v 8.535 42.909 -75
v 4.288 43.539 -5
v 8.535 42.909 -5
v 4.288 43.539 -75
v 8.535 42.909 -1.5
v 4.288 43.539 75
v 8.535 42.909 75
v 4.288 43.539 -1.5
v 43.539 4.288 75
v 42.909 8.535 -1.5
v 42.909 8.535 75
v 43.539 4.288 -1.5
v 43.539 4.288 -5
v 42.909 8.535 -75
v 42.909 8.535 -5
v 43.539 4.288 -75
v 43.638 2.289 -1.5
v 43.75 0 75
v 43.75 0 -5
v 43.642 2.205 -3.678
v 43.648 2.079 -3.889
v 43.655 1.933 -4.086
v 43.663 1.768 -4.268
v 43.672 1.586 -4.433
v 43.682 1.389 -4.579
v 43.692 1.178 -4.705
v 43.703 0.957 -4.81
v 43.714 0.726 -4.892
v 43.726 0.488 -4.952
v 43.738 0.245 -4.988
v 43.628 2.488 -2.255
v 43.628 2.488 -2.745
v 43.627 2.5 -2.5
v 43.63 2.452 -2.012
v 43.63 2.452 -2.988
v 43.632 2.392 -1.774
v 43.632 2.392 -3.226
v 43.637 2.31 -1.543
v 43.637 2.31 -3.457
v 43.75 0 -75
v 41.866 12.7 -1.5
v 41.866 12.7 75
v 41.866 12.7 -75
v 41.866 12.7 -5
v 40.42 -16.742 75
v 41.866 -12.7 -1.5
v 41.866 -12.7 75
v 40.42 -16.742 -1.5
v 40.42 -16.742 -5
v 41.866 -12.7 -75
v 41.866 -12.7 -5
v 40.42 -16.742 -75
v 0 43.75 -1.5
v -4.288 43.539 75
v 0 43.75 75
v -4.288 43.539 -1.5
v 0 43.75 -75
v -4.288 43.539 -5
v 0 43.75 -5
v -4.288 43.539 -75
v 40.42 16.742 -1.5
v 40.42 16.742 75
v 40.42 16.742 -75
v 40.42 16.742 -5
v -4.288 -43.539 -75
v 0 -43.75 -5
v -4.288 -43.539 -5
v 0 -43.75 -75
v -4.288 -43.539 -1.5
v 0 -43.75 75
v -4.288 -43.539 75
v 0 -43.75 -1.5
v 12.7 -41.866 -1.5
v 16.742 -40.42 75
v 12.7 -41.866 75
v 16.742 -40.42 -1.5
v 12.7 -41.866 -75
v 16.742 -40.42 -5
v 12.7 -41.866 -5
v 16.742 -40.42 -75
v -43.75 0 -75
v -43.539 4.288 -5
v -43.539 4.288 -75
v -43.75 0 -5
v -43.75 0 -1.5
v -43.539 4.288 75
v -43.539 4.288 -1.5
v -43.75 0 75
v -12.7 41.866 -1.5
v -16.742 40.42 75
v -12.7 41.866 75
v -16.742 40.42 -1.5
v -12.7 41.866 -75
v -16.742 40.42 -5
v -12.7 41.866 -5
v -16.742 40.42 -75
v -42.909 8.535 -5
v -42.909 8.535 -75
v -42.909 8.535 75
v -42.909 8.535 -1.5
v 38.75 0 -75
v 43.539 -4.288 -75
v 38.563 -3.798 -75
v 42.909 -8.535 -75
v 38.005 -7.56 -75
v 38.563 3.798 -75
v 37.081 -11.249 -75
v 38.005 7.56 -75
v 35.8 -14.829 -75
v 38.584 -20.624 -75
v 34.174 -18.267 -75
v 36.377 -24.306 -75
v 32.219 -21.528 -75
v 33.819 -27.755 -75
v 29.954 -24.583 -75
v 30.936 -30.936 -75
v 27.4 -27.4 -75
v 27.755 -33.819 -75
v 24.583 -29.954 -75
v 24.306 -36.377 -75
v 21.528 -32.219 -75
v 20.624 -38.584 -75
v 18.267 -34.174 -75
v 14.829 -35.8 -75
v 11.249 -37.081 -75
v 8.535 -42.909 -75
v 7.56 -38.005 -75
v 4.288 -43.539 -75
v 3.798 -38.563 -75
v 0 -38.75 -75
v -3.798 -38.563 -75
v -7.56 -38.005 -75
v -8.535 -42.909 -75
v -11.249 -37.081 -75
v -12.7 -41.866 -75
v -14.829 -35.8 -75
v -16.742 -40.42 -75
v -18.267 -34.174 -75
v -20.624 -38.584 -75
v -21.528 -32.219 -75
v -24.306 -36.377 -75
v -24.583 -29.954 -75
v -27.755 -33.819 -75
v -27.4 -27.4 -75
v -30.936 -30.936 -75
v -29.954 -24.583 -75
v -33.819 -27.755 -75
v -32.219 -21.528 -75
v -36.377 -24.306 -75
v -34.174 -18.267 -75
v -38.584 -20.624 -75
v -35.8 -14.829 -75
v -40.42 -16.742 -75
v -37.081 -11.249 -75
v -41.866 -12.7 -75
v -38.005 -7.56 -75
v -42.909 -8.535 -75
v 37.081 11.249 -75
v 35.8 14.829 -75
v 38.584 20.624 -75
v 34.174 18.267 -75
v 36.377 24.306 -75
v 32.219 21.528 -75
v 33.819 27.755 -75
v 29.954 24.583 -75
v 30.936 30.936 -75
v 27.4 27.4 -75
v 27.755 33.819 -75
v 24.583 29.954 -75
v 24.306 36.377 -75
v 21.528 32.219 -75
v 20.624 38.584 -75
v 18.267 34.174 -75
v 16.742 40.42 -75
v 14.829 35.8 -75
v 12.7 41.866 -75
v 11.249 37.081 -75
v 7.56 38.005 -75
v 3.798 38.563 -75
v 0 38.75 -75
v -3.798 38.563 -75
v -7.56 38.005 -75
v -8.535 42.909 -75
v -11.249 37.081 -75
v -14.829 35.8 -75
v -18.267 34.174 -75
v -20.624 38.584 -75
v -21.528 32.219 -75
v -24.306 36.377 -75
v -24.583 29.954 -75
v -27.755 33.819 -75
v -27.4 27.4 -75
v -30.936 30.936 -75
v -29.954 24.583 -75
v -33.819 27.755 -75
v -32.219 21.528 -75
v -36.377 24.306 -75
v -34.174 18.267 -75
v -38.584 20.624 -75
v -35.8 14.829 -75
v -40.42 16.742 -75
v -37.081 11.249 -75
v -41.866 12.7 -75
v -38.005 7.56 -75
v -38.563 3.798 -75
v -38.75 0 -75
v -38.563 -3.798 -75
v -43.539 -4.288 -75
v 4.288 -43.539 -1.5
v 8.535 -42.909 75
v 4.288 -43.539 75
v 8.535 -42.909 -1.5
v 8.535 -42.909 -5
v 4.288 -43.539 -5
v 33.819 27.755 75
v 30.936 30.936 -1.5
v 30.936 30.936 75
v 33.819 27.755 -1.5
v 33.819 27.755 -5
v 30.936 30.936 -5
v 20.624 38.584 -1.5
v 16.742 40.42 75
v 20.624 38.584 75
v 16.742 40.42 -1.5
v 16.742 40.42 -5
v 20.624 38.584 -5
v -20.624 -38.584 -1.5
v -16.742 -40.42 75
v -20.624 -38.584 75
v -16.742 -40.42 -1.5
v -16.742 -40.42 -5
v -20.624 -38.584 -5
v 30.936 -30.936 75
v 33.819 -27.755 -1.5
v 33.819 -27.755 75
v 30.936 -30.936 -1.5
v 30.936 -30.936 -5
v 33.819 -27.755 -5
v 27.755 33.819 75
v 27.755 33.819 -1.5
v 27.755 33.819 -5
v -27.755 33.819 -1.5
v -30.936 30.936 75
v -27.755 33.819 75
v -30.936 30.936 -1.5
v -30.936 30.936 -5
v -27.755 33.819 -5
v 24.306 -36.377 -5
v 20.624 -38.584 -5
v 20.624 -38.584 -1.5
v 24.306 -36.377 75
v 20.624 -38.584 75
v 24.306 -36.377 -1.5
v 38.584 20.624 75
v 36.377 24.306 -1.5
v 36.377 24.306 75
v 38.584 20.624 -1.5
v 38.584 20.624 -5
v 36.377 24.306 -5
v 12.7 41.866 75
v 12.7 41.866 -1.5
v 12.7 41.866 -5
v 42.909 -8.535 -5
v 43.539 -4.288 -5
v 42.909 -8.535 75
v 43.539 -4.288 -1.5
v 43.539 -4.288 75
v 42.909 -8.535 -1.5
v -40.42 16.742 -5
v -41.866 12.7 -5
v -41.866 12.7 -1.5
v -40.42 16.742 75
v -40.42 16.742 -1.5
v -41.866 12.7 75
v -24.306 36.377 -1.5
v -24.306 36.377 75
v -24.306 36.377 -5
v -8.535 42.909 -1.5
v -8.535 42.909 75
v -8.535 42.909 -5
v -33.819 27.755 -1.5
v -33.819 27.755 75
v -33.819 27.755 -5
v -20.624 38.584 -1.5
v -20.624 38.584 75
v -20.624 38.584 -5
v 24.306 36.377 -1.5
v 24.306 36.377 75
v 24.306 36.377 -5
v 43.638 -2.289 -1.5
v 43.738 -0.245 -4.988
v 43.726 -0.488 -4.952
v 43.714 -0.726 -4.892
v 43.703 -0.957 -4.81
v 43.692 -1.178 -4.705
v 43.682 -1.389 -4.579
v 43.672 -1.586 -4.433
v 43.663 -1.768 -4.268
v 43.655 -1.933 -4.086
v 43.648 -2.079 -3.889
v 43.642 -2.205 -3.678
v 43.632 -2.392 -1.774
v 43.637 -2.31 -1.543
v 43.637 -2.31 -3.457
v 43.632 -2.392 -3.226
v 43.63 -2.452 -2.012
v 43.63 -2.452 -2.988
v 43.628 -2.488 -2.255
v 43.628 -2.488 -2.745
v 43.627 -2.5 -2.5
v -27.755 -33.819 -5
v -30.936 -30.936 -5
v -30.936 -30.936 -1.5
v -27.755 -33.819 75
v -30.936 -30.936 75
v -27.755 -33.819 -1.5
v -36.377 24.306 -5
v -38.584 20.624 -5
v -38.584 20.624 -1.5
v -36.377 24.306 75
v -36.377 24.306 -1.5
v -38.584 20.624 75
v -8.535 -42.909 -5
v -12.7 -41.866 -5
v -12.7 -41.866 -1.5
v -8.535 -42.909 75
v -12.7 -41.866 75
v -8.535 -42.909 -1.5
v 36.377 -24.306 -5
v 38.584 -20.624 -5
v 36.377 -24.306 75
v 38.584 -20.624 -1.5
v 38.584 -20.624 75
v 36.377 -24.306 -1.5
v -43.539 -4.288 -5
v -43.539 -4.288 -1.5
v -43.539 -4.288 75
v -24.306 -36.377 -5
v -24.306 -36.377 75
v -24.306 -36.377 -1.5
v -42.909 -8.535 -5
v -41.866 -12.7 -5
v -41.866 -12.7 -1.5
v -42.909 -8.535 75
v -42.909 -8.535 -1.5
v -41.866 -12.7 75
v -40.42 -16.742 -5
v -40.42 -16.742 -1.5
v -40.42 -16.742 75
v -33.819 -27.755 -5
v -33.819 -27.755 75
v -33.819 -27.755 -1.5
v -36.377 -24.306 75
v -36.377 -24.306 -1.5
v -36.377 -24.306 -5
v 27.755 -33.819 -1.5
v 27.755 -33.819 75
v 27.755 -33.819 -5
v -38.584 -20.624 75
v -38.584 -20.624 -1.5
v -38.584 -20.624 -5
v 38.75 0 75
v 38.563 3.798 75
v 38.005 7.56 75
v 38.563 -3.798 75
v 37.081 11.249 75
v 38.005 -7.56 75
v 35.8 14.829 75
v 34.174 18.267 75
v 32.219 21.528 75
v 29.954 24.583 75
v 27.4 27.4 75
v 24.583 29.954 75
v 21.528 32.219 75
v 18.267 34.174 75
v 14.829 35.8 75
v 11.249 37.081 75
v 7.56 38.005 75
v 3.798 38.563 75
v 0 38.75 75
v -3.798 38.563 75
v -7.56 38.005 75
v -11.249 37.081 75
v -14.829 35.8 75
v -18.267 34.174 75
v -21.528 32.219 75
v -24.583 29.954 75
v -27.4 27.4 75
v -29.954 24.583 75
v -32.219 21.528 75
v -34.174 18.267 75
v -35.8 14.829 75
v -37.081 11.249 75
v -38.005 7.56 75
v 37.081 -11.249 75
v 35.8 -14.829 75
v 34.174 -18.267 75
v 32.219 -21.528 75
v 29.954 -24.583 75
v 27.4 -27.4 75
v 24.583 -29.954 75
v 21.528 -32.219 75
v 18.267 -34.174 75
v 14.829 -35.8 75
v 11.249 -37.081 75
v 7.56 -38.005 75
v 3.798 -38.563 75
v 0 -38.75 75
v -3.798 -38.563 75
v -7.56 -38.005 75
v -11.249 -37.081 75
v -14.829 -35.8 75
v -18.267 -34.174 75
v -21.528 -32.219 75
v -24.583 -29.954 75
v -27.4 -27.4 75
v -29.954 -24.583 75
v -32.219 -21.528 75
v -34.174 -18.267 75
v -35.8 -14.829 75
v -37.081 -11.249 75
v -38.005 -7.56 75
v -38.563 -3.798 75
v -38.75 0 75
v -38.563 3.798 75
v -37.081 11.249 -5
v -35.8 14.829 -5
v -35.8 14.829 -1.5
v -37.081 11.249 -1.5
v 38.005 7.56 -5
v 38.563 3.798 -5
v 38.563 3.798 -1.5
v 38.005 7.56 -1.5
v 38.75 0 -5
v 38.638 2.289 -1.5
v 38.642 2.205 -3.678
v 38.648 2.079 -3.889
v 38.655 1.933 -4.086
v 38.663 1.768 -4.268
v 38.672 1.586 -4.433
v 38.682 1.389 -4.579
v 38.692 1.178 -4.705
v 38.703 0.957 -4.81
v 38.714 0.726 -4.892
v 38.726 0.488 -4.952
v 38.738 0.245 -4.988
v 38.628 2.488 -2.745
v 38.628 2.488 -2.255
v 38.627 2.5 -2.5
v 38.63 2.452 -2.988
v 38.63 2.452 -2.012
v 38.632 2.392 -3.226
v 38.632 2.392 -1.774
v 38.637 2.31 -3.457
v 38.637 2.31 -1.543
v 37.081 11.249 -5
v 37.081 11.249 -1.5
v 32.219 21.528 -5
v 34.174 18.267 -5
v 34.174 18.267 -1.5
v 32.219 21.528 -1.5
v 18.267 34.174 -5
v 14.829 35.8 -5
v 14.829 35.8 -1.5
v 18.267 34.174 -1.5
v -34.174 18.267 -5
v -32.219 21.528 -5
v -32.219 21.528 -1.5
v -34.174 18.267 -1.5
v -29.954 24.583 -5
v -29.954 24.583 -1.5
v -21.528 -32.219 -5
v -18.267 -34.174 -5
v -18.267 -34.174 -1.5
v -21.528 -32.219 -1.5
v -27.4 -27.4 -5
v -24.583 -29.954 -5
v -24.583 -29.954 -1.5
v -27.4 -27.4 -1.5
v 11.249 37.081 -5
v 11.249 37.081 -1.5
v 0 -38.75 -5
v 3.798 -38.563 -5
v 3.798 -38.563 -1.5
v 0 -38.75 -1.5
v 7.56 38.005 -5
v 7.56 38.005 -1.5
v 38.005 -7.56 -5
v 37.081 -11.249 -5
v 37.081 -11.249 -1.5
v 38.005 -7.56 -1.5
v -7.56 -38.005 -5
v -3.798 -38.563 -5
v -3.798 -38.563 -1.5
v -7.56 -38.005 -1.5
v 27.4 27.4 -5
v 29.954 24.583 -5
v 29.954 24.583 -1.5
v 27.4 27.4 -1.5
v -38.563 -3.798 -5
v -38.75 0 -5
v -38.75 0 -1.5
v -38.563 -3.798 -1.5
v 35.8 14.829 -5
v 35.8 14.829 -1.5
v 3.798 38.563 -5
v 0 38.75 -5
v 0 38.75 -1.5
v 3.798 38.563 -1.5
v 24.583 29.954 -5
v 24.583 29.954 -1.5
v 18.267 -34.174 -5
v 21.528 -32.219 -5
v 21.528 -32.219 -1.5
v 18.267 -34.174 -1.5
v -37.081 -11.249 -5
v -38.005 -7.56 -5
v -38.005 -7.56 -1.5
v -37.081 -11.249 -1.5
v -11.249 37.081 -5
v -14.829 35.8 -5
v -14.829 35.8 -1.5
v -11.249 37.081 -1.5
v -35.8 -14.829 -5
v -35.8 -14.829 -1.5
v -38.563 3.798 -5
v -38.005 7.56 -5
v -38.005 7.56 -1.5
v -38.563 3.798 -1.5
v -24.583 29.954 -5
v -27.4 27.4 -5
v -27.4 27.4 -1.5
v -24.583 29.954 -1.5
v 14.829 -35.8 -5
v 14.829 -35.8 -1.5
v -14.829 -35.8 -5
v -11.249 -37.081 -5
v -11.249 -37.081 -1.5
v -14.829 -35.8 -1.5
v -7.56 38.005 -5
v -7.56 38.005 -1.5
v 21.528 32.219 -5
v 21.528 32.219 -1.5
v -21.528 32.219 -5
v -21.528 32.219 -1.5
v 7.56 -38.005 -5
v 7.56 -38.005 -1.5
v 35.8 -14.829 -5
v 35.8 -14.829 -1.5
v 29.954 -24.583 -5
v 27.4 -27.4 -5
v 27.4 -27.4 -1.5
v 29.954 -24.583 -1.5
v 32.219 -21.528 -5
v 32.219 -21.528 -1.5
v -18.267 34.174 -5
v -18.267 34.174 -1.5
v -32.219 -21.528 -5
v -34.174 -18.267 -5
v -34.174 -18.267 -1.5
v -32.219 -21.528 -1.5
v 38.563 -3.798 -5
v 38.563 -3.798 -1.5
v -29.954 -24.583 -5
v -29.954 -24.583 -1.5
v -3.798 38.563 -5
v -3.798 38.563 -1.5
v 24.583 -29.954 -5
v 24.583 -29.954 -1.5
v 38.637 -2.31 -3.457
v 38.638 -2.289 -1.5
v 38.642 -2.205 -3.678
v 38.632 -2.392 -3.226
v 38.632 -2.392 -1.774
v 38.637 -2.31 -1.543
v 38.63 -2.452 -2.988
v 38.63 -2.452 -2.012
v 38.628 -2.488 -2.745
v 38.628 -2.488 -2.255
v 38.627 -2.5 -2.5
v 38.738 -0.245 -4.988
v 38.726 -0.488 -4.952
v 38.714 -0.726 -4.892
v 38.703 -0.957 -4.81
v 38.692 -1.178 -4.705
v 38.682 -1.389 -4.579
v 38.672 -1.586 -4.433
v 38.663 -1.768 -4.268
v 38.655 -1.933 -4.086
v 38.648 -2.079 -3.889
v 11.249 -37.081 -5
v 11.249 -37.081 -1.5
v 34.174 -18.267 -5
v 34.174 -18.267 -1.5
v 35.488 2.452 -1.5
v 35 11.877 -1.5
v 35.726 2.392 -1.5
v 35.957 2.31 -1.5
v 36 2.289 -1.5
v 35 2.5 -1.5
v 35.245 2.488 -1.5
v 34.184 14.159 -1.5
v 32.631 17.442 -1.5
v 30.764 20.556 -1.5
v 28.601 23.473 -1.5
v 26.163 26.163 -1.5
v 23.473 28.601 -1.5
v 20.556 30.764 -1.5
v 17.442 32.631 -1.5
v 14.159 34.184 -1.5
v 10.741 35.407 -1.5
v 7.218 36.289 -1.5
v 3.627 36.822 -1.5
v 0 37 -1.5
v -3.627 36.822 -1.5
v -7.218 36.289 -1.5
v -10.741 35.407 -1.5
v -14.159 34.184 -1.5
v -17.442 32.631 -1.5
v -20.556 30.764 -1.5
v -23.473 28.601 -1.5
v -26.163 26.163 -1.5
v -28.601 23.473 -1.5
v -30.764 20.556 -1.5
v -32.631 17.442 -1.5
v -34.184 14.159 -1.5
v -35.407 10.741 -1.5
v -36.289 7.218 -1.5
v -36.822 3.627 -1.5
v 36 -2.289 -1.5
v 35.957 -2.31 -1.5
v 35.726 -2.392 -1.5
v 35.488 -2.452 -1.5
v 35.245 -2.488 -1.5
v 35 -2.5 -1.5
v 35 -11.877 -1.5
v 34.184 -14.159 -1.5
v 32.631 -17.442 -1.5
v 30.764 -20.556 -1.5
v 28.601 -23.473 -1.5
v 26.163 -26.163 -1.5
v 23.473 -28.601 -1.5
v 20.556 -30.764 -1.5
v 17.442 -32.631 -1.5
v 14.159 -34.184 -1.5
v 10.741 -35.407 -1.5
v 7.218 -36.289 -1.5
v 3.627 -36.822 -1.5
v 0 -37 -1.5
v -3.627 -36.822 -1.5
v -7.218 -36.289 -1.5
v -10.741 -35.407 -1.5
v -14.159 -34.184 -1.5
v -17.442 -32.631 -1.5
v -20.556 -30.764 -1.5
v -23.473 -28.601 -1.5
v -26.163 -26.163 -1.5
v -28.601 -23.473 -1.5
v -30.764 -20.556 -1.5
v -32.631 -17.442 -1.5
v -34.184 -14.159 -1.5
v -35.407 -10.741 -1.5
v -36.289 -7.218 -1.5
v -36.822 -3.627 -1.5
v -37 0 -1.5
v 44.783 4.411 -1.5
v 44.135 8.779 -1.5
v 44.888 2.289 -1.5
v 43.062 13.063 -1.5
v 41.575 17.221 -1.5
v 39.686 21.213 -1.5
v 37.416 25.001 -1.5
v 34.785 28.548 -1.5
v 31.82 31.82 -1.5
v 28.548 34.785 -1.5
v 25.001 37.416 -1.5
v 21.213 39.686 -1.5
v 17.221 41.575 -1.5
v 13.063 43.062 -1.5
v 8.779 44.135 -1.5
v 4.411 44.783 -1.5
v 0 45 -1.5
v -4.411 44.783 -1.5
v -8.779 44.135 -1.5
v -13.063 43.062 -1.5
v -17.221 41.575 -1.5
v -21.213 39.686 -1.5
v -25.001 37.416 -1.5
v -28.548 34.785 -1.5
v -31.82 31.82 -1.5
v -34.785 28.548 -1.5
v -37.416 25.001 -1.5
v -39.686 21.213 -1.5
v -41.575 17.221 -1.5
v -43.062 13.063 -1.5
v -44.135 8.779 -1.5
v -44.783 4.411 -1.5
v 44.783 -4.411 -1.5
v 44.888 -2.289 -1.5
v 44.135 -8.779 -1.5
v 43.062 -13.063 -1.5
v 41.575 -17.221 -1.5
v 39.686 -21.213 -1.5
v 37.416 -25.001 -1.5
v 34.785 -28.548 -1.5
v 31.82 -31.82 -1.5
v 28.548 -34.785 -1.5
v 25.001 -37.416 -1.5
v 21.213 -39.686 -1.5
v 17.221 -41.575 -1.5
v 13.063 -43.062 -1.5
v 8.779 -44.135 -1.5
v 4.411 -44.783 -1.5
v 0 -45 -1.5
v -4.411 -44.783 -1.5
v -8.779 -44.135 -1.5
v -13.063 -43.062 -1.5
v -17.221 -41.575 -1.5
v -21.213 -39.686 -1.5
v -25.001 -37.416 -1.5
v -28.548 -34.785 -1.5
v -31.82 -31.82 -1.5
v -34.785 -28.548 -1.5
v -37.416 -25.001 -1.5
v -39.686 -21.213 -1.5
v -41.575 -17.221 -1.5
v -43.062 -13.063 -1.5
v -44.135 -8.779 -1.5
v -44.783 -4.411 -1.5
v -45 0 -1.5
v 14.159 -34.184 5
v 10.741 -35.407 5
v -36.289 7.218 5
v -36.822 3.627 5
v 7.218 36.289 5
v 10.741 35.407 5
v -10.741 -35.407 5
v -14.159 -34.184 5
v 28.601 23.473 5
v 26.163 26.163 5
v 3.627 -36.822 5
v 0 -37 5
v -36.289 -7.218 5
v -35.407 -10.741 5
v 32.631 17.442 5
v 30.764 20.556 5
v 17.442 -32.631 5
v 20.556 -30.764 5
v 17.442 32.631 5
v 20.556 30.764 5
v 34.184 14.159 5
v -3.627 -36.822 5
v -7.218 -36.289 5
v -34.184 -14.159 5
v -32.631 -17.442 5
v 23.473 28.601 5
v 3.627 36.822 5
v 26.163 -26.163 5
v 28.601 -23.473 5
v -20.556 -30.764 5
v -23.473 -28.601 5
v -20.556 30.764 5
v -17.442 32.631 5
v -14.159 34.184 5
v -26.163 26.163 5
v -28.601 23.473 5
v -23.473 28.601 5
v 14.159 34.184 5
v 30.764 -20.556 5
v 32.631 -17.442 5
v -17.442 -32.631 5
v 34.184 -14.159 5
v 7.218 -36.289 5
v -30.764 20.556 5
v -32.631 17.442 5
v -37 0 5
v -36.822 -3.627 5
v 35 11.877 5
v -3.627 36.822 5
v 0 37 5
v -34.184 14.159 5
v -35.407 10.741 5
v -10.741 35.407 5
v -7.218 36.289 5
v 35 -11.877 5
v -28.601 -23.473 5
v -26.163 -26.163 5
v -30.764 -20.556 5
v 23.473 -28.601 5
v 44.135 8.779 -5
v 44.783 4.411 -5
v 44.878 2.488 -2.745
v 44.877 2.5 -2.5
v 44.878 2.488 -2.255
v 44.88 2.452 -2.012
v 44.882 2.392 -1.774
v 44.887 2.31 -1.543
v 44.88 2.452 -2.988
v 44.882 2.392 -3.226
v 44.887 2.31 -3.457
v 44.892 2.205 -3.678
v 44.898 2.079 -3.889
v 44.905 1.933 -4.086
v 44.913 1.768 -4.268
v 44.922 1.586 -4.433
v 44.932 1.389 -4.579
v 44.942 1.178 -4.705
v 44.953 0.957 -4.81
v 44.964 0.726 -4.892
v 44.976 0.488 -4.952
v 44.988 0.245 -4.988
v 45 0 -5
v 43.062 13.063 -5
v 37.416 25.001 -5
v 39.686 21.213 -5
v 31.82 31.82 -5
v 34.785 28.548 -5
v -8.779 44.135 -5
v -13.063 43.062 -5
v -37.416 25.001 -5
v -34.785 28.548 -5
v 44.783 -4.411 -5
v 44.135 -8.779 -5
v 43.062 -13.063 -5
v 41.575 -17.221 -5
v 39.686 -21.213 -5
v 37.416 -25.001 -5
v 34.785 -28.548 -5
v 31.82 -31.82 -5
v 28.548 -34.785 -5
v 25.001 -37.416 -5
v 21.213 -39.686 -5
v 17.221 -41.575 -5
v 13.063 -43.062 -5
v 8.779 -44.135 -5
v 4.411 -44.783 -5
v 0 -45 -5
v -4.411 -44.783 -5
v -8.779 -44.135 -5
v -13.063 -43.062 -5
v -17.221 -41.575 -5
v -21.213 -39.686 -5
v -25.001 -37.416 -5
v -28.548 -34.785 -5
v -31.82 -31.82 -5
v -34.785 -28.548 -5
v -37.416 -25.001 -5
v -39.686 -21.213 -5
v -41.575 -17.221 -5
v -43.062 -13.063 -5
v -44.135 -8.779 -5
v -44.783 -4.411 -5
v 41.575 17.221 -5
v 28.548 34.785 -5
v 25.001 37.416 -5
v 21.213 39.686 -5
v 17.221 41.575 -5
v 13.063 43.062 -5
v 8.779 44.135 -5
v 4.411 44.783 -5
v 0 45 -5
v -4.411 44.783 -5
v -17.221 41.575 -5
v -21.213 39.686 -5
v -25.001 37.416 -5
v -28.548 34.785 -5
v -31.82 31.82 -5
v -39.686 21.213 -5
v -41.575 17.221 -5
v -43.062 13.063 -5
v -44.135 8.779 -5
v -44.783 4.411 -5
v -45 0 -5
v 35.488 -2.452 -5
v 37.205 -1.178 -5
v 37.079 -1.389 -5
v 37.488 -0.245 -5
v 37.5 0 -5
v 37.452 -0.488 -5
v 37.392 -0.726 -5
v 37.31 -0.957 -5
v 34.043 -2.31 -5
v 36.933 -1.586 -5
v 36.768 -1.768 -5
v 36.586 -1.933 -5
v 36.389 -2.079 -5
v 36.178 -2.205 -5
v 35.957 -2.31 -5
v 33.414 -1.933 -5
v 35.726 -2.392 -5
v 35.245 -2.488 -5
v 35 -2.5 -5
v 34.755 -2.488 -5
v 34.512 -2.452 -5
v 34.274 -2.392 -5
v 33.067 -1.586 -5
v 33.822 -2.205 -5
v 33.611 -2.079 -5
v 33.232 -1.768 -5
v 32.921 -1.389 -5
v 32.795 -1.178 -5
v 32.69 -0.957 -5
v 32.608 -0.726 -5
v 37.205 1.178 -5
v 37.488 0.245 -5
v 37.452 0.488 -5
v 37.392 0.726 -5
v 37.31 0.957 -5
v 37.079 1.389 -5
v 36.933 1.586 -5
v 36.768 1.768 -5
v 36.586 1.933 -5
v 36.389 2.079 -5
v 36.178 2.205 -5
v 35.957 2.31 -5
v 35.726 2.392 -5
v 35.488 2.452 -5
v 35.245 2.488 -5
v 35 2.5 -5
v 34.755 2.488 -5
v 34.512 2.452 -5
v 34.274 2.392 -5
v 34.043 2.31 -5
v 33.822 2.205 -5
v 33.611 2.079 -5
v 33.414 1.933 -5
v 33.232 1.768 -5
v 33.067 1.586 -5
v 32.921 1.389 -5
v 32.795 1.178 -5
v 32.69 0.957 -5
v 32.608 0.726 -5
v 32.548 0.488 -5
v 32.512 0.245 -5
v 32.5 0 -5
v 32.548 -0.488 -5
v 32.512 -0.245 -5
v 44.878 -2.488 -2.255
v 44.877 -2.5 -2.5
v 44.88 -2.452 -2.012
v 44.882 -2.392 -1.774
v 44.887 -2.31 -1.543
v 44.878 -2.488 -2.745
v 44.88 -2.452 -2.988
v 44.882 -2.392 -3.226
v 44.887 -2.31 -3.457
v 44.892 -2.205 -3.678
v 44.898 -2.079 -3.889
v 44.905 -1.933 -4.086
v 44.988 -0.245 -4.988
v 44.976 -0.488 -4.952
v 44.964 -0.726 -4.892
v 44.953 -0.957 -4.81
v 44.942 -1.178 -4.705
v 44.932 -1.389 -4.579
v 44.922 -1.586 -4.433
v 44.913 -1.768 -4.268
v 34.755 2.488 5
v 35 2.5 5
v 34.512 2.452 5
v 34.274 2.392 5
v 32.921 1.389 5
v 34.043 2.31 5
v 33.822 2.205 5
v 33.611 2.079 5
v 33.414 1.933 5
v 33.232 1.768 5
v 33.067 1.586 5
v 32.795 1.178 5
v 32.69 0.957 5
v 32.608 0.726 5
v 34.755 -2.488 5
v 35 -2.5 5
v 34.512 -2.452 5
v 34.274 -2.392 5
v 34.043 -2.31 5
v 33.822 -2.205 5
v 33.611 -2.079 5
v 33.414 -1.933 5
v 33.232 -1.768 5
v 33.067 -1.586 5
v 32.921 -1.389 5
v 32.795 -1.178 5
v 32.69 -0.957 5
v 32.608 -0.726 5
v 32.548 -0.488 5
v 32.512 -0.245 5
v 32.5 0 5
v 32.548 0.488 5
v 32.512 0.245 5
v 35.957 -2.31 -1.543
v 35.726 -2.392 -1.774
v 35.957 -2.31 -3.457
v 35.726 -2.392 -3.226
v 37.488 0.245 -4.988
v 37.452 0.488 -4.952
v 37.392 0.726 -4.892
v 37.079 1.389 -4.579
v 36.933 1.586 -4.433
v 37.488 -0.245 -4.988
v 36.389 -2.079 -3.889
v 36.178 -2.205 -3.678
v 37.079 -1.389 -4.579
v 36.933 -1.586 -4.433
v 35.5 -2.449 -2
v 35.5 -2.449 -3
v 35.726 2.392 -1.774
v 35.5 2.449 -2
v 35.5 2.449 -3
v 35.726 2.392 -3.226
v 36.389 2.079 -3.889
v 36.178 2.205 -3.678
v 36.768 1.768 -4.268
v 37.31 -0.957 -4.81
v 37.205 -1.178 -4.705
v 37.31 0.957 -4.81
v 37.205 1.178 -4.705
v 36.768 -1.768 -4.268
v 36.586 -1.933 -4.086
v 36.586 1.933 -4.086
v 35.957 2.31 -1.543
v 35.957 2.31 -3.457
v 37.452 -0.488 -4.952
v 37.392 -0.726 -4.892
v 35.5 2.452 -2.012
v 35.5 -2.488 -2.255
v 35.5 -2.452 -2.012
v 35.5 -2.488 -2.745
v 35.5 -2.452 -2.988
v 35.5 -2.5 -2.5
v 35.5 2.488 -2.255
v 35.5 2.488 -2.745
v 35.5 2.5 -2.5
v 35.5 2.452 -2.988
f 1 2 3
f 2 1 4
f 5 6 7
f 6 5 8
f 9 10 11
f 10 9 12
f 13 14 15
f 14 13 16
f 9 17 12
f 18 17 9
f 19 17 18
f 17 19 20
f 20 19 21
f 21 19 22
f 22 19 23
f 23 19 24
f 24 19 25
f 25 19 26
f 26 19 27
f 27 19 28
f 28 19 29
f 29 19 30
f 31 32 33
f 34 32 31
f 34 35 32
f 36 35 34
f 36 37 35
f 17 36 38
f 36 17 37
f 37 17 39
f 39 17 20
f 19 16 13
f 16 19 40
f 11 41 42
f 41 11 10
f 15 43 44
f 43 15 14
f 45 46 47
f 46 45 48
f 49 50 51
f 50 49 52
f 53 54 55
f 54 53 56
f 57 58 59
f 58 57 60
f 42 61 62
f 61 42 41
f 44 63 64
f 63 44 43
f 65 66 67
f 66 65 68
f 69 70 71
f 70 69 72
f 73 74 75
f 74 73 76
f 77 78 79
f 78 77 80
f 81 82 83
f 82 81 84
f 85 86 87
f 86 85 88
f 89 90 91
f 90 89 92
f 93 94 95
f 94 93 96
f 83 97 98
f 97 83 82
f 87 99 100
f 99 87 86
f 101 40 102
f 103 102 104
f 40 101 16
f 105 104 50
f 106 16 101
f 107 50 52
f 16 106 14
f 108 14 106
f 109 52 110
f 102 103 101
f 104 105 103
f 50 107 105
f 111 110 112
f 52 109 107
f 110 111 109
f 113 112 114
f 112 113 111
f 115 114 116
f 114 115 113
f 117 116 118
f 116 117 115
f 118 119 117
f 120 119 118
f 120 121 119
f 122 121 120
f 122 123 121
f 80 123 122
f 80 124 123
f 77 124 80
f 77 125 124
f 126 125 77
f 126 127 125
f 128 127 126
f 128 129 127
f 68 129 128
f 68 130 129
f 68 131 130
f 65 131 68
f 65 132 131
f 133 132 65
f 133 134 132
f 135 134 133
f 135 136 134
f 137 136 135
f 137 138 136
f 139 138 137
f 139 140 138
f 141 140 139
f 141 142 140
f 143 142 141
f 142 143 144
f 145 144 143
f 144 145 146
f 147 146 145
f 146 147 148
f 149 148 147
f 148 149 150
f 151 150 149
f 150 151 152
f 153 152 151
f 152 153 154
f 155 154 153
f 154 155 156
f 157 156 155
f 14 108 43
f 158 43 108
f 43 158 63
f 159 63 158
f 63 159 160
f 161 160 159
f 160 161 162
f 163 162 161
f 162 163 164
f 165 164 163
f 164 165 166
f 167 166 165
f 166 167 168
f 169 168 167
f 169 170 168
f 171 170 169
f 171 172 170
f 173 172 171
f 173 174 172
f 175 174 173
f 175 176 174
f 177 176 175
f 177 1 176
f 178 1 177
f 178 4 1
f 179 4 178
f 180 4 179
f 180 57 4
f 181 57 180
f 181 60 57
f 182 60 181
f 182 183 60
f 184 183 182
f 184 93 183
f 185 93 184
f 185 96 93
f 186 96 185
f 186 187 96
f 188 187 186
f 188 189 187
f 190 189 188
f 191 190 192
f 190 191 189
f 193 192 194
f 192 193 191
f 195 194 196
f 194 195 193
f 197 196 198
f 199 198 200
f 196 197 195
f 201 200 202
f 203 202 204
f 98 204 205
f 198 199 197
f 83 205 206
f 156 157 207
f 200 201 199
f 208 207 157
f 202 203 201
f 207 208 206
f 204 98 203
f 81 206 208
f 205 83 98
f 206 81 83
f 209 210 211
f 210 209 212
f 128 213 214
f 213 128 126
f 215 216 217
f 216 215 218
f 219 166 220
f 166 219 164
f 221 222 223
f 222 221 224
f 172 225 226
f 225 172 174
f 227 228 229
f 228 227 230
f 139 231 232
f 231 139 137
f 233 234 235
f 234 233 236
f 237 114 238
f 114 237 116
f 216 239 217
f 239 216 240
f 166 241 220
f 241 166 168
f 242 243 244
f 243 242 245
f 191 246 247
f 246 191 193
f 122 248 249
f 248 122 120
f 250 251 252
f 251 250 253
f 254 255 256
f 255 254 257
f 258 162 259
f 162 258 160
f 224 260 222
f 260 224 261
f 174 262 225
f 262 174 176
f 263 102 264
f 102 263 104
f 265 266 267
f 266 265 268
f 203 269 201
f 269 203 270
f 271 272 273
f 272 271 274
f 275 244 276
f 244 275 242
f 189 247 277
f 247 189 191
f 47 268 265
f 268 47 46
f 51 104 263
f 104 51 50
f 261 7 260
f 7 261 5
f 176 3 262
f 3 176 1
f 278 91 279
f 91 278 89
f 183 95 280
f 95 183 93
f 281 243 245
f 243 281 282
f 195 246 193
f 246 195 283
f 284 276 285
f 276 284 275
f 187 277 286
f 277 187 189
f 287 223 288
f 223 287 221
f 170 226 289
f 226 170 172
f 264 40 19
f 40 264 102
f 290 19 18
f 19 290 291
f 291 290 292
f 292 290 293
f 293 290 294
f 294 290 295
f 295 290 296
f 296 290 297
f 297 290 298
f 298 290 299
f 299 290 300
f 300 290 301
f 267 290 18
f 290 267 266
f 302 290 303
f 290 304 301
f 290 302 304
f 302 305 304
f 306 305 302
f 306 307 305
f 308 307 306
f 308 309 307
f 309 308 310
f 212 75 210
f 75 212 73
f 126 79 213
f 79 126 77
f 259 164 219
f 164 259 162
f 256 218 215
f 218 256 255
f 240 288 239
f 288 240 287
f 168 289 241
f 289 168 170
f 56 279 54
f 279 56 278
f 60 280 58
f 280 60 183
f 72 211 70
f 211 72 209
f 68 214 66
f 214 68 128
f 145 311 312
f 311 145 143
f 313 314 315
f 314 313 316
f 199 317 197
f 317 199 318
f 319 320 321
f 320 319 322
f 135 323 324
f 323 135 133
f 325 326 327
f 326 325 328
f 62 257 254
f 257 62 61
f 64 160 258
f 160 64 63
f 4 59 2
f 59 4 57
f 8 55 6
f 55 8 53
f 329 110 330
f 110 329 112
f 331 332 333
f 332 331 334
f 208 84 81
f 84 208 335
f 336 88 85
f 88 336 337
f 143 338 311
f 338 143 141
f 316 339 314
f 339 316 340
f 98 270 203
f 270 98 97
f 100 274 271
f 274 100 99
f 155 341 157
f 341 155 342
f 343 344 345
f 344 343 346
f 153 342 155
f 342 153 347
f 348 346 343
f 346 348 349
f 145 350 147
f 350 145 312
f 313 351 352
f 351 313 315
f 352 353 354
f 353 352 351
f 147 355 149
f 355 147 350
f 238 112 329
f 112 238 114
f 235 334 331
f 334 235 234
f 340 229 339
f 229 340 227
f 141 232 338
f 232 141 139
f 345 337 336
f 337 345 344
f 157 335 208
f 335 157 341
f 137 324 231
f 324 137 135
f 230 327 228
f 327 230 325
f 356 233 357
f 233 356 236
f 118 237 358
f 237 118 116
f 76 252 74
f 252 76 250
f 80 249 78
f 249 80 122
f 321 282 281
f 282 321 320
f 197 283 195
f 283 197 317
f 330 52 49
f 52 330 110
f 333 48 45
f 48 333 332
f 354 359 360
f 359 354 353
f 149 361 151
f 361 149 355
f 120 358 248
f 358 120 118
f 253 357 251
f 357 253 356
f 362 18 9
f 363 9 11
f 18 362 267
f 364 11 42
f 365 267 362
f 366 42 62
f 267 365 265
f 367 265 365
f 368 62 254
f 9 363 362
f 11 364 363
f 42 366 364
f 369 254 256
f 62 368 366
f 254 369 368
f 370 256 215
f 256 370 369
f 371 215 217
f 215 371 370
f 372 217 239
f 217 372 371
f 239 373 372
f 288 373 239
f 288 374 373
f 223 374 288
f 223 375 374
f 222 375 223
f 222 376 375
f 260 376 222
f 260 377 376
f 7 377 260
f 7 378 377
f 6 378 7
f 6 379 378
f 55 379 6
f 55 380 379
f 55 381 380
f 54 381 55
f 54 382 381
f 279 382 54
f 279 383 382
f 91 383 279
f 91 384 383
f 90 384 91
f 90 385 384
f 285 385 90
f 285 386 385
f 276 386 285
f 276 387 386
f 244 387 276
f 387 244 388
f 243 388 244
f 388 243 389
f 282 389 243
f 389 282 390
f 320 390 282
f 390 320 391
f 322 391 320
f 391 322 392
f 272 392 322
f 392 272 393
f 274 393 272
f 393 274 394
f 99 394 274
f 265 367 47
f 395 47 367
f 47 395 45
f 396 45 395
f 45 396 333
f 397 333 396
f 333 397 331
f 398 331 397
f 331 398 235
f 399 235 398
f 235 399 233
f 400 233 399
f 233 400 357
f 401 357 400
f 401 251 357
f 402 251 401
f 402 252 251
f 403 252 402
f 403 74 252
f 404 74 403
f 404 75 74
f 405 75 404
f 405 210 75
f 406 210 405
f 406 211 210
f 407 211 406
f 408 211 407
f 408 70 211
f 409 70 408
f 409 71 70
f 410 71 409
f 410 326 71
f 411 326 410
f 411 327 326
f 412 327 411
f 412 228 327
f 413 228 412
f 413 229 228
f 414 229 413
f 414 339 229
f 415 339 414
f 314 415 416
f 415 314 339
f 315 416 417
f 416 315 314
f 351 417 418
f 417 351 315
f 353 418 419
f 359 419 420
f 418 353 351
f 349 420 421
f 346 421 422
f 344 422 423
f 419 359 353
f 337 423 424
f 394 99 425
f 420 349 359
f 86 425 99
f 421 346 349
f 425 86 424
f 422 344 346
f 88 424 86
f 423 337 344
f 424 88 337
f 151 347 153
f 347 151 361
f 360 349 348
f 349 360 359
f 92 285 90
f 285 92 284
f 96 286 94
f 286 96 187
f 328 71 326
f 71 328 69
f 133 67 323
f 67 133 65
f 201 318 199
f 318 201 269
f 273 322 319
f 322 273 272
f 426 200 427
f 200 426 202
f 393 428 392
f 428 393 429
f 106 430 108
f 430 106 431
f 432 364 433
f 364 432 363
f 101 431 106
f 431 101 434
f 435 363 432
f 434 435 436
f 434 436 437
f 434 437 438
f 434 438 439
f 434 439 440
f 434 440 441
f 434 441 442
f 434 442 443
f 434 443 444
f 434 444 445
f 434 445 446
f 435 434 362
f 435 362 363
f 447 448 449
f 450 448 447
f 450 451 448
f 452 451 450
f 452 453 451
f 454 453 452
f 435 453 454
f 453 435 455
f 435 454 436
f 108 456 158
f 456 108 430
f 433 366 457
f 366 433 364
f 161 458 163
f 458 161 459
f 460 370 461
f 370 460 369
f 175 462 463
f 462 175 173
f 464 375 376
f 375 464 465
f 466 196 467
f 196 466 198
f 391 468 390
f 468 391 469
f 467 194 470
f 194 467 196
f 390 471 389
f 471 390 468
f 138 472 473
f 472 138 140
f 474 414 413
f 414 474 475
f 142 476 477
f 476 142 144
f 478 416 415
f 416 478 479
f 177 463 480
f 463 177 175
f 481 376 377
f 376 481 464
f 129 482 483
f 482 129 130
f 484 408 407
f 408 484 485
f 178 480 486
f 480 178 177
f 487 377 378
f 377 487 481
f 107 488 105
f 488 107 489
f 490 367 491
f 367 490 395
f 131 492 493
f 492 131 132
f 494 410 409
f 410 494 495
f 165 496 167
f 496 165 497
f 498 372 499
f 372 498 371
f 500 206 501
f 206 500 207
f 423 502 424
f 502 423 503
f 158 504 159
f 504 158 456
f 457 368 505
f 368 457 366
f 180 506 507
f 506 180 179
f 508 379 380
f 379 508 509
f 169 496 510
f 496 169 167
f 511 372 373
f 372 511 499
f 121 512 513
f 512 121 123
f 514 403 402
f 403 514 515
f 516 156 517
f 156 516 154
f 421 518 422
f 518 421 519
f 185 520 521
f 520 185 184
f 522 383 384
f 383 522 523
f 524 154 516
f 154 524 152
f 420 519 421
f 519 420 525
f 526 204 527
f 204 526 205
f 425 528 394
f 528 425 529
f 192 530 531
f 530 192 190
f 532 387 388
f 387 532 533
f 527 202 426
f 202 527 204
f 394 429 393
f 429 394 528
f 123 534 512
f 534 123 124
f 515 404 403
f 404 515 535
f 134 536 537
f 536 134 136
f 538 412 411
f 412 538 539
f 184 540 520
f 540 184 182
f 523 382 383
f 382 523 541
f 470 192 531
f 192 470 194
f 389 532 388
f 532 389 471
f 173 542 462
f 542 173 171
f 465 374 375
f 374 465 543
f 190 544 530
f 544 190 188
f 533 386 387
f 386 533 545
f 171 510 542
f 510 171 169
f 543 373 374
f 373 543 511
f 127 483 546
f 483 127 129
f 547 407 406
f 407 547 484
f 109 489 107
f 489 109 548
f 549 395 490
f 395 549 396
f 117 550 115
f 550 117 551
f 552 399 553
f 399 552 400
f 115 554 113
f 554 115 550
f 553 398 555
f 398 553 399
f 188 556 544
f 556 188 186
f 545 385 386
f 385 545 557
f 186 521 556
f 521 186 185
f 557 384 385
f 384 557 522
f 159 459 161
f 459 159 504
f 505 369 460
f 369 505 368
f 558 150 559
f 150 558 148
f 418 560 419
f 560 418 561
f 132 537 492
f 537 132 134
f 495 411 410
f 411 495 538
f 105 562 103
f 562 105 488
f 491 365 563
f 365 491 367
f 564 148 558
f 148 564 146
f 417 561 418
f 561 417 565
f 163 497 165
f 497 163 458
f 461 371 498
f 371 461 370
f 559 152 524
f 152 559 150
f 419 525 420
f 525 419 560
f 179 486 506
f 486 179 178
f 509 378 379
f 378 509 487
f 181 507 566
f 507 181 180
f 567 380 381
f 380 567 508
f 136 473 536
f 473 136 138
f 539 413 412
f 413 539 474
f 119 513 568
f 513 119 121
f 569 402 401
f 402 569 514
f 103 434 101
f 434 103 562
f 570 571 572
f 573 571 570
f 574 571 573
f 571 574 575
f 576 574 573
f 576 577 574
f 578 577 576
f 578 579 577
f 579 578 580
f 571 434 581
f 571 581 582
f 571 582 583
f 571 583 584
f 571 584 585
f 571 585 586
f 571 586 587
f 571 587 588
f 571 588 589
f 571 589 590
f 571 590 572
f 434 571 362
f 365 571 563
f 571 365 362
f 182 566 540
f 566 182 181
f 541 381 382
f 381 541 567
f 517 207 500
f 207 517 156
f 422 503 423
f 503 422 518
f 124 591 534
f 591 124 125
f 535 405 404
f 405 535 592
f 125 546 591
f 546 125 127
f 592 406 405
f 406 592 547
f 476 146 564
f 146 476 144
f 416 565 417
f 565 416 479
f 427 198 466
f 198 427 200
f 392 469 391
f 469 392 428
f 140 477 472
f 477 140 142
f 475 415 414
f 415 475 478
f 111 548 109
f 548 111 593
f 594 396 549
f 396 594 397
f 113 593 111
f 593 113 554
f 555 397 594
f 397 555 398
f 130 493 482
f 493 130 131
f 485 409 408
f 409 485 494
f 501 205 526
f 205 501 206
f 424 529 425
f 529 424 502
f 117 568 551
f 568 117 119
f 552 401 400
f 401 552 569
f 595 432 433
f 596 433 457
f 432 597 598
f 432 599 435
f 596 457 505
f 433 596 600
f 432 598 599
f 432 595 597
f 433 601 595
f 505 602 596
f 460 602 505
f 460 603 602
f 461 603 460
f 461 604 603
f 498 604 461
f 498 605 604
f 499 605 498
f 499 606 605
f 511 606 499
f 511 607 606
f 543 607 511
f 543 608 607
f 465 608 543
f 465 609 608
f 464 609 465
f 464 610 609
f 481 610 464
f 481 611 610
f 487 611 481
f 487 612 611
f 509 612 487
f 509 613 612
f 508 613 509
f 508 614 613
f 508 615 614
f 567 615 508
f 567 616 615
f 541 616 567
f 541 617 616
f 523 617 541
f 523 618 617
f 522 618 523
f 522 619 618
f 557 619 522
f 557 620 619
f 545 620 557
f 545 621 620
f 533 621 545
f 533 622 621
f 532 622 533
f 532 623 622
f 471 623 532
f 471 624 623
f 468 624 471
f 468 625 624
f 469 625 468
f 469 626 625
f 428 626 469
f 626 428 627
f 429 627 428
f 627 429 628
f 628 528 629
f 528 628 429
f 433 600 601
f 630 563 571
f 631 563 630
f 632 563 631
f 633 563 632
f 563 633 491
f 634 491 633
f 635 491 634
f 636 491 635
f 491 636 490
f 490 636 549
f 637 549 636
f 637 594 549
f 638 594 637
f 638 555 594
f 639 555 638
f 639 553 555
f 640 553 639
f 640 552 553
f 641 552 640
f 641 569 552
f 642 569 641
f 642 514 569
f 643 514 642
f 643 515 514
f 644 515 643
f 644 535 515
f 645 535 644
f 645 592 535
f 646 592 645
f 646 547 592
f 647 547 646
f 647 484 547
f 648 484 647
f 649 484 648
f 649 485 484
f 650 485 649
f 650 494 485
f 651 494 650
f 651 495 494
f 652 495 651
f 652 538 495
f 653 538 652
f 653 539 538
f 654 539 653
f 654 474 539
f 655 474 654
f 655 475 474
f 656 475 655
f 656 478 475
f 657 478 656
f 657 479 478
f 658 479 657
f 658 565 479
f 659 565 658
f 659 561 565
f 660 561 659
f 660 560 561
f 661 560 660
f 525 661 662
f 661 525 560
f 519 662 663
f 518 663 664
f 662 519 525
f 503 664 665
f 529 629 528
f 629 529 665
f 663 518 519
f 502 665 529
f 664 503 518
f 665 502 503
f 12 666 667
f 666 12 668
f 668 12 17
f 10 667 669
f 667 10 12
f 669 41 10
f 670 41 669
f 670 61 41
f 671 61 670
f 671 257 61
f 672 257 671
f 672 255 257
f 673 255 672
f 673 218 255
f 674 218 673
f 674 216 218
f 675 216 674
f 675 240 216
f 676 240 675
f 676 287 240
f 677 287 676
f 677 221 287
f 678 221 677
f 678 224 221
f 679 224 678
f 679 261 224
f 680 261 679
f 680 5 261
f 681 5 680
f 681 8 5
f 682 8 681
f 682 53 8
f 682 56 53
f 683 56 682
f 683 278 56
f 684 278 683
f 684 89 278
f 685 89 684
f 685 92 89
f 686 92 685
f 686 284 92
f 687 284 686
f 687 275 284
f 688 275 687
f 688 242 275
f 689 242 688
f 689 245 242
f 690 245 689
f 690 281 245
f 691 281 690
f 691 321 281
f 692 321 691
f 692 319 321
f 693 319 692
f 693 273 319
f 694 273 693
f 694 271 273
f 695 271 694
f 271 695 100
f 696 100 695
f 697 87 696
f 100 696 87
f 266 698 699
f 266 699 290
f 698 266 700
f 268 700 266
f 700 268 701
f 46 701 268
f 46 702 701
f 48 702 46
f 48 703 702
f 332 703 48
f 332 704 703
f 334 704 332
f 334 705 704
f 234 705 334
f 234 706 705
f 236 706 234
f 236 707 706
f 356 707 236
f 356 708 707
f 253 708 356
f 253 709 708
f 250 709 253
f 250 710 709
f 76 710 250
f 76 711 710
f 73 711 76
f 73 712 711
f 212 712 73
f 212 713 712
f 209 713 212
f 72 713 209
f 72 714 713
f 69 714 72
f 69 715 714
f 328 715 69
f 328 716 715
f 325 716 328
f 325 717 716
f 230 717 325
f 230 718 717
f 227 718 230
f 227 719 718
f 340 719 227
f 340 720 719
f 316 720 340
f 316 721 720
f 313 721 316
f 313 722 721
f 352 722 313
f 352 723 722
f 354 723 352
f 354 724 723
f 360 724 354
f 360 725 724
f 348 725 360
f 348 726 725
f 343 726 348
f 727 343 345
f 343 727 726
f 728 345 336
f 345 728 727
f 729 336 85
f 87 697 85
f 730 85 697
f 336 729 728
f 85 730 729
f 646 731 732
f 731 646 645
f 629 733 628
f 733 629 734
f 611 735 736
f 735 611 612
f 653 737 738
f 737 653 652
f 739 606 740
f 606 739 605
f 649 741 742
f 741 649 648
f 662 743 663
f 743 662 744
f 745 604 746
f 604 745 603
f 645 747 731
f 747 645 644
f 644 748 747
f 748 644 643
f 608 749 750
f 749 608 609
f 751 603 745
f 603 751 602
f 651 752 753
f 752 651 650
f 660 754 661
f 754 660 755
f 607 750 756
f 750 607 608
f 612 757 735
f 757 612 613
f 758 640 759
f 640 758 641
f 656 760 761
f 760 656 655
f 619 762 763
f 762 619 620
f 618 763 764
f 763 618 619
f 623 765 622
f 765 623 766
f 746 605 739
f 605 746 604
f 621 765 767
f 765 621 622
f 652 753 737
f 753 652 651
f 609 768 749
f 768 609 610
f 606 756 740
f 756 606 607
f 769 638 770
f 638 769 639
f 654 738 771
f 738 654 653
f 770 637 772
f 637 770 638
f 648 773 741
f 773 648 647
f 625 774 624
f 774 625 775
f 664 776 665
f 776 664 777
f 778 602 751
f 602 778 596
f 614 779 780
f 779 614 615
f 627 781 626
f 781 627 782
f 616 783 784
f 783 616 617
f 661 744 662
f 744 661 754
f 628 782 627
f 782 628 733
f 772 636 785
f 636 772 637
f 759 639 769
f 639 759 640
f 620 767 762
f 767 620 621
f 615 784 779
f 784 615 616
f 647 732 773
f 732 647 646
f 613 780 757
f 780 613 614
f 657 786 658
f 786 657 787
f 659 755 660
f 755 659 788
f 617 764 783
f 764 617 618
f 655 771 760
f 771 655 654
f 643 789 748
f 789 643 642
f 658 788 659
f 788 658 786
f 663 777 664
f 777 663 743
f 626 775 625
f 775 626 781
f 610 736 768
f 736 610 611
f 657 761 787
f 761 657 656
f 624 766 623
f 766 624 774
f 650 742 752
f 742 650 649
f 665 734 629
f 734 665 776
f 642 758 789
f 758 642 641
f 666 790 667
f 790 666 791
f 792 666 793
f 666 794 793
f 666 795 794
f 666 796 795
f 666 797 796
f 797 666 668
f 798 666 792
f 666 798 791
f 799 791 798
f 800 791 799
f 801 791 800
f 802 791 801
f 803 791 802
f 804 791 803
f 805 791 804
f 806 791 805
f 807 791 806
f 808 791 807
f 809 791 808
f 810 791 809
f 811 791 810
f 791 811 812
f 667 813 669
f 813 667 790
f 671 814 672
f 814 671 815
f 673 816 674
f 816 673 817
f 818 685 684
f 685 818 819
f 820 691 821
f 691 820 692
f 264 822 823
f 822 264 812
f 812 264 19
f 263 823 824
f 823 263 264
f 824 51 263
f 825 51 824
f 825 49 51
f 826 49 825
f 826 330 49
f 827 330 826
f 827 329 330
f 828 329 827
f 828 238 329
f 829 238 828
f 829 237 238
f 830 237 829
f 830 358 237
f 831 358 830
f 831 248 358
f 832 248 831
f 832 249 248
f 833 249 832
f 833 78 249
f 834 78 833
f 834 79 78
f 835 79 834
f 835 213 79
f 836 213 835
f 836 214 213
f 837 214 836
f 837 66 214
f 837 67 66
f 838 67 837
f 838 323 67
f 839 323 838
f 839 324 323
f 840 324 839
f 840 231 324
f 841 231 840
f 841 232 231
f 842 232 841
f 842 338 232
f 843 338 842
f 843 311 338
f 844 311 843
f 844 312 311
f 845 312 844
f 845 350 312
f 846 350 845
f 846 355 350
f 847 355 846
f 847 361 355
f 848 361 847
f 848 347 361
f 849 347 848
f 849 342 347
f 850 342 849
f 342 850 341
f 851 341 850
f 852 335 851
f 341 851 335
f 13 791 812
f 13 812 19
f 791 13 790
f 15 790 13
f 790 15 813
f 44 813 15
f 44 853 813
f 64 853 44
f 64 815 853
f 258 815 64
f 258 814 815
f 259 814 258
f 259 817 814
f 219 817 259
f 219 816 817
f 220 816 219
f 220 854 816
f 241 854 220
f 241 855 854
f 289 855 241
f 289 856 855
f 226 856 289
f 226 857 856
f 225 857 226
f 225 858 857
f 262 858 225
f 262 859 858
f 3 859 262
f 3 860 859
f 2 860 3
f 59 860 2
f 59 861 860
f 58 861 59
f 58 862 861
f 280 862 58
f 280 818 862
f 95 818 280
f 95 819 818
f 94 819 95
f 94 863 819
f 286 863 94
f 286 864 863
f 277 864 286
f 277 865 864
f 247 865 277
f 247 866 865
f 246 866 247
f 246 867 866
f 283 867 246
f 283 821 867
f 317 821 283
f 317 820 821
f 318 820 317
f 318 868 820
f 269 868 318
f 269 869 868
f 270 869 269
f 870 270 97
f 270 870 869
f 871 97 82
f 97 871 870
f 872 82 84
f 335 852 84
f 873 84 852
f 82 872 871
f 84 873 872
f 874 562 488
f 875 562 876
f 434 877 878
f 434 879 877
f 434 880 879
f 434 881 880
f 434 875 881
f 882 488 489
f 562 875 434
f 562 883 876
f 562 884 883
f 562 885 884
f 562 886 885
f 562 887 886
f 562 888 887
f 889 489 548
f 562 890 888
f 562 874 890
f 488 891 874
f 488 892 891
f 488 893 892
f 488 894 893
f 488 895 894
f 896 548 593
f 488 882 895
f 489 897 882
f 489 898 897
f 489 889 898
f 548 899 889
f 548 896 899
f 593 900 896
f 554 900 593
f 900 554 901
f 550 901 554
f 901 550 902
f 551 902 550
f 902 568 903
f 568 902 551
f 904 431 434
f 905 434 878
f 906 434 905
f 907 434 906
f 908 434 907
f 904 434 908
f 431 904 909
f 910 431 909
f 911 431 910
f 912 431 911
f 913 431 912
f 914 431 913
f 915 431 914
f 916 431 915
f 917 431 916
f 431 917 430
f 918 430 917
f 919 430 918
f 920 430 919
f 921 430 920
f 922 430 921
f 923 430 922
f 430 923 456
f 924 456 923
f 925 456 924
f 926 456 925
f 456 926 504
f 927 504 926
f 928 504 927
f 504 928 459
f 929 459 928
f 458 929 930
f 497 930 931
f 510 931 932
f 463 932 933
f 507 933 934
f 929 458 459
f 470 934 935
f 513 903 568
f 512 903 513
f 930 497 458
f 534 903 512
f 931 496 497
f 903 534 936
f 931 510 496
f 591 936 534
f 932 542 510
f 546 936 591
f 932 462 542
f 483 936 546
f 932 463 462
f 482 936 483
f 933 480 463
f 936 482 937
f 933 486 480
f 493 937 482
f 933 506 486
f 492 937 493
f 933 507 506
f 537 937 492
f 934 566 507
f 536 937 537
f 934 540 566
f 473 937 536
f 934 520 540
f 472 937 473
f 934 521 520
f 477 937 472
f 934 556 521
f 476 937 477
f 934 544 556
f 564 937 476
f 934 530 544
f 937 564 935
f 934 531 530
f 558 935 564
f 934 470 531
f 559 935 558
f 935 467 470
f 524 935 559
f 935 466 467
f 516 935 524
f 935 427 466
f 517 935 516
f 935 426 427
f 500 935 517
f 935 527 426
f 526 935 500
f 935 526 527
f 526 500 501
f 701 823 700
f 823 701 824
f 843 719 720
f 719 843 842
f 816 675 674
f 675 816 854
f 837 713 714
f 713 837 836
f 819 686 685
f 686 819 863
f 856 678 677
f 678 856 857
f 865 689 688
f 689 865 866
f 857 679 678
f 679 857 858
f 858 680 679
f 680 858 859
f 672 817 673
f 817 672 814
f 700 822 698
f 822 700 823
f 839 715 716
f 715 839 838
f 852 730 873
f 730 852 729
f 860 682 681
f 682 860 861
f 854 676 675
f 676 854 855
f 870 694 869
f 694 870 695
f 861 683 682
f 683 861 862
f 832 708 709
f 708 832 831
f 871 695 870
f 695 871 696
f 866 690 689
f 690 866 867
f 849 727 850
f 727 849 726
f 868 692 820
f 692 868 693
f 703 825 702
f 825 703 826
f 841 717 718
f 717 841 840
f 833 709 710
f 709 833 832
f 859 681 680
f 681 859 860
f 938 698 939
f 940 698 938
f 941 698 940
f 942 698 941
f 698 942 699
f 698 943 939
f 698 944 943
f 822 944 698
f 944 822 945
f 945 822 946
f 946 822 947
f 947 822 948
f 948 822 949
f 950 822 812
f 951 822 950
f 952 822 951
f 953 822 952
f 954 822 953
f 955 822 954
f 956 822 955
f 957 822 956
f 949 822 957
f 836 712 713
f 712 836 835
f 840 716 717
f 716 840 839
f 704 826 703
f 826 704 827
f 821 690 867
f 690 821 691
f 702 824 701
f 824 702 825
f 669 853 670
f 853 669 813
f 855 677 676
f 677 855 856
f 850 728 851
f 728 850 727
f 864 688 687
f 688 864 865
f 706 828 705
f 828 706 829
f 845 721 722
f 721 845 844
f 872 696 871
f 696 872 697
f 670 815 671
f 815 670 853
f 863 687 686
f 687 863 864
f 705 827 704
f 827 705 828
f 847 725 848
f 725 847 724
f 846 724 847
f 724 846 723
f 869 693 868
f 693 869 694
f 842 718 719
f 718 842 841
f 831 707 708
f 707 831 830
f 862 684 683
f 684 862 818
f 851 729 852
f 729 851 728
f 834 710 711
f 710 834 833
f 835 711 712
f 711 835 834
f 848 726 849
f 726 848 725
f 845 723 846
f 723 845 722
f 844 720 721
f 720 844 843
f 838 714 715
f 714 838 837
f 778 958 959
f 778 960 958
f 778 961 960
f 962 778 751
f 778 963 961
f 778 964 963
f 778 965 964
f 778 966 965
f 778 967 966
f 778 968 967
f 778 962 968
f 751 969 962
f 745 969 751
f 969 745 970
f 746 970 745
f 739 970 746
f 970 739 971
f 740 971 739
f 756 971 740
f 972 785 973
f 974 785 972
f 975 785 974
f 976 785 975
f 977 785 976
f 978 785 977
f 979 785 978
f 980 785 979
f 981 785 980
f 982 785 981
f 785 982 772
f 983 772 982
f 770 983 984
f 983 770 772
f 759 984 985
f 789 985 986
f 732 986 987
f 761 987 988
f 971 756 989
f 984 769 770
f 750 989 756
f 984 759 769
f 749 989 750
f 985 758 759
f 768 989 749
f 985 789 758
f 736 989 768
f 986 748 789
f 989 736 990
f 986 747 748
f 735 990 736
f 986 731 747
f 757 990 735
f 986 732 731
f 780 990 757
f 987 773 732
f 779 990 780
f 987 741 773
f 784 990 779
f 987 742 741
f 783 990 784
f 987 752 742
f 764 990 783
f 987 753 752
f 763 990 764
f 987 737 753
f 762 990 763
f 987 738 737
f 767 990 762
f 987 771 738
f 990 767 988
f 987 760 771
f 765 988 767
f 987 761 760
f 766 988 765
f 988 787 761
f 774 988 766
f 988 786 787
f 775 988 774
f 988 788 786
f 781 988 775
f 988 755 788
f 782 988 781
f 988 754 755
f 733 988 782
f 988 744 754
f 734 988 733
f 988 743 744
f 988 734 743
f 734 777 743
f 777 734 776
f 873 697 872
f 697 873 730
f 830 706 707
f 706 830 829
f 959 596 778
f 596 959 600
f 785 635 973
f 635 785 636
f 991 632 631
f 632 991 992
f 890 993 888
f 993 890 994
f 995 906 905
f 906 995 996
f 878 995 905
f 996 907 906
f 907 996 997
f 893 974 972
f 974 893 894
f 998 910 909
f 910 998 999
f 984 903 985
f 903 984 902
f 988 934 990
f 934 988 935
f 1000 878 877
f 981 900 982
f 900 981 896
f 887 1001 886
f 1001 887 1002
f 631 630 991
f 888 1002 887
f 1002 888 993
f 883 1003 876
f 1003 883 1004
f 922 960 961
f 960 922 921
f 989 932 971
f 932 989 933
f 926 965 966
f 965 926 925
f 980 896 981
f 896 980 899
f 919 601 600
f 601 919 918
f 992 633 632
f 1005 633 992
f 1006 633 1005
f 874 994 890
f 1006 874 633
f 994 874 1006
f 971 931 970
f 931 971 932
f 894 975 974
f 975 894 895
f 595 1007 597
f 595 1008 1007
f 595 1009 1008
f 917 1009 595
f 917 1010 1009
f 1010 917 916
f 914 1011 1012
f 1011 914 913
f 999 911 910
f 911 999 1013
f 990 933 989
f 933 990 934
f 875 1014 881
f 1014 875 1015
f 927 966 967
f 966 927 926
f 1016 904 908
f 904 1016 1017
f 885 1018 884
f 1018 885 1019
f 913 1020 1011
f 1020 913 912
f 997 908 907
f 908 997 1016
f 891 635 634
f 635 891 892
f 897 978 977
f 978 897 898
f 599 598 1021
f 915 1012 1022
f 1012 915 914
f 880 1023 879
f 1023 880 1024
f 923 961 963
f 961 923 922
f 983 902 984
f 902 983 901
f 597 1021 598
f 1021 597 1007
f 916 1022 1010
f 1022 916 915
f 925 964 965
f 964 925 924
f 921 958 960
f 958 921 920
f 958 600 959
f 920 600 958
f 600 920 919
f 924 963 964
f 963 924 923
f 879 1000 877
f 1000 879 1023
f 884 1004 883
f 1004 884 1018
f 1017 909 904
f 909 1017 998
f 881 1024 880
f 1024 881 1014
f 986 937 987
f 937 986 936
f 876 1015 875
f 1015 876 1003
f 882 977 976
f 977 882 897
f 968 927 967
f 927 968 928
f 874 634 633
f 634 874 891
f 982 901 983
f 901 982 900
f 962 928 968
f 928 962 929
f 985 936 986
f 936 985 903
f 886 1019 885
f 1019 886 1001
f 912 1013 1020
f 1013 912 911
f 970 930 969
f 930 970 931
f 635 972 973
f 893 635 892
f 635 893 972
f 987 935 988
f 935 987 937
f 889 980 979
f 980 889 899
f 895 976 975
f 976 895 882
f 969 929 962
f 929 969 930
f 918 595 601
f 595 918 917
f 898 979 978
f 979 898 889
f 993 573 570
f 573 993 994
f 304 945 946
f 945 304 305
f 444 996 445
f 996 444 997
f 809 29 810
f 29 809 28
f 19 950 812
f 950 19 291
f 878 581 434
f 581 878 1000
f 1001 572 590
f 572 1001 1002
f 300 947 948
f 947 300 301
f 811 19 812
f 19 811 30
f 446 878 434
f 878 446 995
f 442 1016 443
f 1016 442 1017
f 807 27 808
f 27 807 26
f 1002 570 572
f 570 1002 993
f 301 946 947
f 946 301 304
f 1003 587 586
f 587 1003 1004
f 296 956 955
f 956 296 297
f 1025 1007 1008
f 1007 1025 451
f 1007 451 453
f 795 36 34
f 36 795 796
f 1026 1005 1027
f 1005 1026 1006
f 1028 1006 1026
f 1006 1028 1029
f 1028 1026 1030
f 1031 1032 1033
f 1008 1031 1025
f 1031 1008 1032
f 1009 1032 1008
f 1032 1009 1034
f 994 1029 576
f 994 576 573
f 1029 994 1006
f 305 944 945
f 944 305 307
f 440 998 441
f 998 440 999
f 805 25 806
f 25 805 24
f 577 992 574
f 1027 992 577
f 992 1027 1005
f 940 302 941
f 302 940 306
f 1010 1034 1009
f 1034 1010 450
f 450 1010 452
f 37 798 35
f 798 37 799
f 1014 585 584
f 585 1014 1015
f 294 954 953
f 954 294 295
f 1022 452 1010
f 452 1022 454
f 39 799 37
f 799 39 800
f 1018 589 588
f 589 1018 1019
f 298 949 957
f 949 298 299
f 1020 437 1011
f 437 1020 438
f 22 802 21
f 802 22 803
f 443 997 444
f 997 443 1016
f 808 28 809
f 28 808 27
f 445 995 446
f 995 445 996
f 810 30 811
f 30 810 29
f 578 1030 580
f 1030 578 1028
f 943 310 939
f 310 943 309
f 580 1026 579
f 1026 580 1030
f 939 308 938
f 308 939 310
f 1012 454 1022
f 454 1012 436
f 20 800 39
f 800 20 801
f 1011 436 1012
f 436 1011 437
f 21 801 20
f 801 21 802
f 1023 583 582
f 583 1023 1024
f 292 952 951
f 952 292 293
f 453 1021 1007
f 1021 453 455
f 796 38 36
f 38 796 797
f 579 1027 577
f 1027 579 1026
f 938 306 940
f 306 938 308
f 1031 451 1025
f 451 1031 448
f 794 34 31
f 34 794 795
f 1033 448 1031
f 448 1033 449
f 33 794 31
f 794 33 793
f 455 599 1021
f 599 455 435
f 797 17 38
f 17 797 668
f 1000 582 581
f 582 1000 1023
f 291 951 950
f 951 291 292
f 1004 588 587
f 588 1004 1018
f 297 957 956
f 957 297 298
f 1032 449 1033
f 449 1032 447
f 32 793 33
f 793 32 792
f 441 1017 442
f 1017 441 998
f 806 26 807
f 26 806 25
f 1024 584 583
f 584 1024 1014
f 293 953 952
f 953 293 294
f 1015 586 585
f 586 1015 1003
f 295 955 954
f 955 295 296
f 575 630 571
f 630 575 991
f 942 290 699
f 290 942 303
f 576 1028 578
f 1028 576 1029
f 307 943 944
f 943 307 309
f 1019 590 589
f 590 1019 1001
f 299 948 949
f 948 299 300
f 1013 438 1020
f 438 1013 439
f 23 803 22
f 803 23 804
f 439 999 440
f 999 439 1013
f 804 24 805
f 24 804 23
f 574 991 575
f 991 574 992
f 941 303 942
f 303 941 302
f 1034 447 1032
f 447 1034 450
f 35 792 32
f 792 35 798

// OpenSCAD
// file: nut_banana.scad
//nut();

module nut(){
    color("pink")
    difference(){
        cylinder(d=12, h=2, center=true, $fn=6);
        cylinder(d=5.5, h=3, center=true, $fn=54);
    }
}
// file: banana.scad
include <nut_banana.scad>


$fn = 64;
diam_hole = 5.4 + 0.5;

//banana();

//translate([0, 0, -25/2-0.5])
//banana();
//translate([0, 20/2, -5])
//rotate([0, 0, 90])
//nut();
//
//translate([0, -20/2, -5])
//rotate([0, 0, 90])
//nut();
//color("red")
//translate([-3, 0, 0])
//cube([20, 40-6, 25-6], center=true);


module banana() {
    difference() {
        base();
        holes_banana();
    }
}
module base() {
    cube([20, 40, 25], center=true);
}

module holes_banana() {
  translate([0, 20/2, 2])
    cylinder(d=diam_hole, h=50,center = true);

  translate([0, -20/2, 2])
    cylinder(d=diam_hole, h=50,center = true);
    
  translate([-3, 0, -3])
  cube([20, 40-6, 25], center=true);  
}
// file: speaker_bottom.scad
include <speaker_walls.scad>;
$fn = 640;

bottom_kit();


module bottom_kit() {
    difference() {
        bottom();
        holes();
    }
}

module holes() {
    translate([90/2, 0, 25/2-1.5])
    cube([20, 40, 25], center=true);
    //vertical hole
    translate([90/2-20/2, 0, 0])
    cylinder(d=5, h=30, center=true);
    
    //horizontal hole
    translate([90/2-20/2+8, 0, -5/2])
    rotate([0, 90, 0])
    cylinder(d=5, h=15, center=true);
}

module bottom() {
    difference() {
        cylinder(d = 90, h = 10, center = true);
        translate([0, 0, 150/2+10/4-4])
        walls(thickness = 12);
    }
}
// file: speaker_walls.scad
// Bluetooth speaker
$fn = 640;

walls(thickness=5);

module walls(thickness) {
    difference() {
        cylinder(d = 80 + thickness/2+5, h = 150, center = true);
        color("red")
        cylinder(d = 80-thickness/2, h = 160, center = true);
    }
}
// main file
include <speaker_walls.scad>
include <speaker_bottom.scad>
use <banana.scad>
$fn = 64;

//bottom_kit();

//translate([90/2 + 20/2 - 8, 0, 25/2 - 5])
//banana();
//translate([0, 0, 150/2+10/4-4])
walls(thickness = 5); 

//difference(){
//    bottom_kit();
//    translate([-90/2, 0, 0])
//    cube(90, center = true);
//}
